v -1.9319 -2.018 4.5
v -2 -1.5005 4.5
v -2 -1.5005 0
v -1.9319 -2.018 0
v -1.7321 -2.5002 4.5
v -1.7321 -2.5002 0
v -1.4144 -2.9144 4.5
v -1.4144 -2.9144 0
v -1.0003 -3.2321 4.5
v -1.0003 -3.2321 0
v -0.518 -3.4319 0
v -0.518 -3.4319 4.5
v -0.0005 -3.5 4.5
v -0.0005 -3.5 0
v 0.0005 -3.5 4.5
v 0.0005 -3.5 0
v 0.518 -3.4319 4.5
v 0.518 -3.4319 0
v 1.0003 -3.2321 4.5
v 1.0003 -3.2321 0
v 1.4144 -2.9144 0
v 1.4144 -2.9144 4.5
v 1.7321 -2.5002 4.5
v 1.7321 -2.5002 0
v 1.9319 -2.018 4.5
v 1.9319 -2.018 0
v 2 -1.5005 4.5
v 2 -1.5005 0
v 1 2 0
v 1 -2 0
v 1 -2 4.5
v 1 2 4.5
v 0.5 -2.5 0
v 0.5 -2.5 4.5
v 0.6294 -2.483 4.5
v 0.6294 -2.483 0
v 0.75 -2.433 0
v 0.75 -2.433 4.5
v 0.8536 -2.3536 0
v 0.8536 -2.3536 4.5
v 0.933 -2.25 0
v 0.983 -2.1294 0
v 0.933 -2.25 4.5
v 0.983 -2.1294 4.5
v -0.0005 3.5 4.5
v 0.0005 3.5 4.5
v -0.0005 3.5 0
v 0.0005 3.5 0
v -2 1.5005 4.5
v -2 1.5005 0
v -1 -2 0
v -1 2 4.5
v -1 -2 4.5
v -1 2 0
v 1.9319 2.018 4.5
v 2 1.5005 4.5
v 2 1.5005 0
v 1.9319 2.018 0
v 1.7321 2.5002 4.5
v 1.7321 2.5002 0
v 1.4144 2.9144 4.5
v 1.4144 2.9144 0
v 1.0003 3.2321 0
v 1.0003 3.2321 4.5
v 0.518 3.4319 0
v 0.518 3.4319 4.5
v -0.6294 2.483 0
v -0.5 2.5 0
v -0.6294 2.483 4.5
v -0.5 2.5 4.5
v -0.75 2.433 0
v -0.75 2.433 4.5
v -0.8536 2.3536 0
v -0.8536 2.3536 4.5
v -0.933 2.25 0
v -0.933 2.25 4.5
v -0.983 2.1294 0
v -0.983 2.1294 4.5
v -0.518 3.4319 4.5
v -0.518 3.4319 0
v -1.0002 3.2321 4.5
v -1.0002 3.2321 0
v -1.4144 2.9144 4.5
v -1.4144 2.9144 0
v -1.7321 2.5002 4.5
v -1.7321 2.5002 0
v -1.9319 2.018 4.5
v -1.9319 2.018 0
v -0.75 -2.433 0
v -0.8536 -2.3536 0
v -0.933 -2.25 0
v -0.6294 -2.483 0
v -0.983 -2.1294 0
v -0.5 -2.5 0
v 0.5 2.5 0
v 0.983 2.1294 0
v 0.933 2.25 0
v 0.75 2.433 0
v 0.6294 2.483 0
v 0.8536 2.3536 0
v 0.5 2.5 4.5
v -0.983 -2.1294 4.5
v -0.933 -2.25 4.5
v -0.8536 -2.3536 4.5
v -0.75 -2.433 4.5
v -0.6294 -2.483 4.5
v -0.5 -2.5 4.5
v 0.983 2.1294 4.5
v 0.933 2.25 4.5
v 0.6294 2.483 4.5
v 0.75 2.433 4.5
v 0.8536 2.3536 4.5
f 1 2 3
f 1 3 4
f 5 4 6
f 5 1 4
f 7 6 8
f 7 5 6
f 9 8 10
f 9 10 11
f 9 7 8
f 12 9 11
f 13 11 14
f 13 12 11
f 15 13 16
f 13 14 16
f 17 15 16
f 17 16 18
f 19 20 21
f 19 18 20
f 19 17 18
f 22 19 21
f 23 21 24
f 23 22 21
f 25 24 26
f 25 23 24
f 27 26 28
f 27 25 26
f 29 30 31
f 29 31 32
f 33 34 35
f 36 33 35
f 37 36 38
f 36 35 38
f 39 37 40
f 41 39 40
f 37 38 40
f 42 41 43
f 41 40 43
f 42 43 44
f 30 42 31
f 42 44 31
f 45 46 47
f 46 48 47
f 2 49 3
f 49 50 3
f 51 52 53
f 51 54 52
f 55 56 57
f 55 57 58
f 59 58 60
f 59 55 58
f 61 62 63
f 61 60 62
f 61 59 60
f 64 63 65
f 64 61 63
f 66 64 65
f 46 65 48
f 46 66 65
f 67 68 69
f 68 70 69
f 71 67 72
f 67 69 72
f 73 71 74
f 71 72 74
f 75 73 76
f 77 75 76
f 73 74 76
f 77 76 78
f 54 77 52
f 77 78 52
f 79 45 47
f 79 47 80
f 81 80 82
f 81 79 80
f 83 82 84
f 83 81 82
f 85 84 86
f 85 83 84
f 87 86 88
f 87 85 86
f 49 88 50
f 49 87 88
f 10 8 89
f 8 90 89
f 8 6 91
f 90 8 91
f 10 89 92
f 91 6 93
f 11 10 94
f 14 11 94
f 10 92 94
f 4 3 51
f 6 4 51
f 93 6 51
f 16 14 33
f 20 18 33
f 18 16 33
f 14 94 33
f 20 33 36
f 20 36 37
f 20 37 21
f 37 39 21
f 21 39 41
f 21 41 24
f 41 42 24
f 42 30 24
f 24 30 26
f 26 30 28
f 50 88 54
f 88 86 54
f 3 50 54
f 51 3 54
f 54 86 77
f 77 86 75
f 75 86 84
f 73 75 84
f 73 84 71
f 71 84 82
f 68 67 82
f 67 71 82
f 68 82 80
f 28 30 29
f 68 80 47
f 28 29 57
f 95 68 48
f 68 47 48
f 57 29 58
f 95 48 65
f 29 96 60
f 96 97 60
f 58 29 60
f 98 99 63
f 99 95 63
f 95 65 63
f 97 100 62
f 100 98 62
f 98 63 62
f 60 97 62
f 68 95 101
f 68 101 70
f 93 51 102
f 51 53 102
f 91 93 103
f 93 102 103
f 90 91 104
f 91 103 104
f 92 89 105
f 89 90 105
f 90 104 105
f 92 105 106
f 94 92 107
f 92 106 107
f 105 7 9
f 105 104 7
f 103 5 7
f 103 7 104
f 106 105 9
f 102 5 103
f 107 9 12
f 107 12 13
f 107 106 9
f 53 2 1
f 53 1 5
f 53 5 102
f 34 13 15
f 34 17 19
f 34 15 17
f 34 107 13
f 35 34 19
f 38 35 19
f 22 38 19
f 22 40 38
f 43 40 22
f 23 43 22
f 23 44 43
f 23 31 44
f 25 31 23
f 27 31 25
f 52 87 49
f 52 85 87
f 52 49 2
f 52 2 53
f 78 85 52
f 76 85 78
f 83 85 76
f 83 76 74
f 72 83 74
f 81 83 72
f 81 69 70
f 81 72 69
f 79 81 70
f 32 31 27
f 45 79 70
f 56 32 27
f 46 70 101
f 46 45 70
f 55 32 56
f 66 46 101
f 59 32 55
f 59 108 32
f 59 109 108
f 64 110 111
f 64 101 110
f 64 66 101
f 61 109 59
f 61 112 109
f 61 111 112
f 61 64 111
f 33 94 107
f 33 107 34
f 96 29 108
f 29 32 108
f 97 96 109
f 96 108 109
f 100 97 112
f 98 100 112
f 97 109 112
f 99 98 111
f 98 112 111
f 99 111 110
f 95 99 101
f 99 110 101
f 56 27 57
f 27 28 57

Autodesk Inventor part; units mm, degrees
ref_plane "YZ Plane" through (0, 0, 0) normal (1, 0, 0) x (0, 1, 0)
ref_plane "XZ Plane" through (0, 0, 0) normal (0, 1, 0) x (-1, 0, 0)
ref_plane "XY Plane" through (0, 0, 0) normal (0, 0, 1) x (1, 0, 0)
sketch "Sketch1" plane through (0, 0, 0) normal (0, 0, 1) x (1, 0, 0)
  line L0 (-1, -2.5) -> (1, -2.5)
  line L1 (1, -2.5) -> (1, 2.5)
  line L2 (1, 2.5) -> (-1, 2.5)
  line L3 (-1, 2.5) -> (-1, -2.5)
  line L4 (-1, -2.5) -> (1, 2.5) construction
  line L5 (1, -2.5) -> (-1, 2.5) construction
  line L6 (-2, -3.5) -> (2, -3.5)
  line L7 (2, -3.5) -> (2, 3.5)
  line L8 (2, 3.5) -> (-2, 3.5)
  line L9 (-2, 3.5) -> (-2, -3.5)
  line L10 (-2, -3.5) -> (2, 3.5) construction
  line L11 (2, -3.5) -> (-2, 3.5) construction
  point P0 (0, 0)
  point P1 (0, 0)
  dimension "d5" = 2
  dimension "d6" = 5
  dimension "d7" = 4
  dimension "d8" = 7
extrude "Extrusion1" add sketch "Sketch1" along normal blind 4.5
fillet "Fillet1" radius 2 4 edges at (2, 3.5, 2.25) (-2, 3.5, 2.25) (2, -3.5, 2.25) (-2, -3.5, 2.25)
fillet "Fillet2" radius 0.5 4 edges at (-1, 2.5, 2.25) (1, 2.5, 2.25) (-1, -2.5, 2.25) (1, -2.5, 2.25)
properties part number "COILS" material "Copper"
